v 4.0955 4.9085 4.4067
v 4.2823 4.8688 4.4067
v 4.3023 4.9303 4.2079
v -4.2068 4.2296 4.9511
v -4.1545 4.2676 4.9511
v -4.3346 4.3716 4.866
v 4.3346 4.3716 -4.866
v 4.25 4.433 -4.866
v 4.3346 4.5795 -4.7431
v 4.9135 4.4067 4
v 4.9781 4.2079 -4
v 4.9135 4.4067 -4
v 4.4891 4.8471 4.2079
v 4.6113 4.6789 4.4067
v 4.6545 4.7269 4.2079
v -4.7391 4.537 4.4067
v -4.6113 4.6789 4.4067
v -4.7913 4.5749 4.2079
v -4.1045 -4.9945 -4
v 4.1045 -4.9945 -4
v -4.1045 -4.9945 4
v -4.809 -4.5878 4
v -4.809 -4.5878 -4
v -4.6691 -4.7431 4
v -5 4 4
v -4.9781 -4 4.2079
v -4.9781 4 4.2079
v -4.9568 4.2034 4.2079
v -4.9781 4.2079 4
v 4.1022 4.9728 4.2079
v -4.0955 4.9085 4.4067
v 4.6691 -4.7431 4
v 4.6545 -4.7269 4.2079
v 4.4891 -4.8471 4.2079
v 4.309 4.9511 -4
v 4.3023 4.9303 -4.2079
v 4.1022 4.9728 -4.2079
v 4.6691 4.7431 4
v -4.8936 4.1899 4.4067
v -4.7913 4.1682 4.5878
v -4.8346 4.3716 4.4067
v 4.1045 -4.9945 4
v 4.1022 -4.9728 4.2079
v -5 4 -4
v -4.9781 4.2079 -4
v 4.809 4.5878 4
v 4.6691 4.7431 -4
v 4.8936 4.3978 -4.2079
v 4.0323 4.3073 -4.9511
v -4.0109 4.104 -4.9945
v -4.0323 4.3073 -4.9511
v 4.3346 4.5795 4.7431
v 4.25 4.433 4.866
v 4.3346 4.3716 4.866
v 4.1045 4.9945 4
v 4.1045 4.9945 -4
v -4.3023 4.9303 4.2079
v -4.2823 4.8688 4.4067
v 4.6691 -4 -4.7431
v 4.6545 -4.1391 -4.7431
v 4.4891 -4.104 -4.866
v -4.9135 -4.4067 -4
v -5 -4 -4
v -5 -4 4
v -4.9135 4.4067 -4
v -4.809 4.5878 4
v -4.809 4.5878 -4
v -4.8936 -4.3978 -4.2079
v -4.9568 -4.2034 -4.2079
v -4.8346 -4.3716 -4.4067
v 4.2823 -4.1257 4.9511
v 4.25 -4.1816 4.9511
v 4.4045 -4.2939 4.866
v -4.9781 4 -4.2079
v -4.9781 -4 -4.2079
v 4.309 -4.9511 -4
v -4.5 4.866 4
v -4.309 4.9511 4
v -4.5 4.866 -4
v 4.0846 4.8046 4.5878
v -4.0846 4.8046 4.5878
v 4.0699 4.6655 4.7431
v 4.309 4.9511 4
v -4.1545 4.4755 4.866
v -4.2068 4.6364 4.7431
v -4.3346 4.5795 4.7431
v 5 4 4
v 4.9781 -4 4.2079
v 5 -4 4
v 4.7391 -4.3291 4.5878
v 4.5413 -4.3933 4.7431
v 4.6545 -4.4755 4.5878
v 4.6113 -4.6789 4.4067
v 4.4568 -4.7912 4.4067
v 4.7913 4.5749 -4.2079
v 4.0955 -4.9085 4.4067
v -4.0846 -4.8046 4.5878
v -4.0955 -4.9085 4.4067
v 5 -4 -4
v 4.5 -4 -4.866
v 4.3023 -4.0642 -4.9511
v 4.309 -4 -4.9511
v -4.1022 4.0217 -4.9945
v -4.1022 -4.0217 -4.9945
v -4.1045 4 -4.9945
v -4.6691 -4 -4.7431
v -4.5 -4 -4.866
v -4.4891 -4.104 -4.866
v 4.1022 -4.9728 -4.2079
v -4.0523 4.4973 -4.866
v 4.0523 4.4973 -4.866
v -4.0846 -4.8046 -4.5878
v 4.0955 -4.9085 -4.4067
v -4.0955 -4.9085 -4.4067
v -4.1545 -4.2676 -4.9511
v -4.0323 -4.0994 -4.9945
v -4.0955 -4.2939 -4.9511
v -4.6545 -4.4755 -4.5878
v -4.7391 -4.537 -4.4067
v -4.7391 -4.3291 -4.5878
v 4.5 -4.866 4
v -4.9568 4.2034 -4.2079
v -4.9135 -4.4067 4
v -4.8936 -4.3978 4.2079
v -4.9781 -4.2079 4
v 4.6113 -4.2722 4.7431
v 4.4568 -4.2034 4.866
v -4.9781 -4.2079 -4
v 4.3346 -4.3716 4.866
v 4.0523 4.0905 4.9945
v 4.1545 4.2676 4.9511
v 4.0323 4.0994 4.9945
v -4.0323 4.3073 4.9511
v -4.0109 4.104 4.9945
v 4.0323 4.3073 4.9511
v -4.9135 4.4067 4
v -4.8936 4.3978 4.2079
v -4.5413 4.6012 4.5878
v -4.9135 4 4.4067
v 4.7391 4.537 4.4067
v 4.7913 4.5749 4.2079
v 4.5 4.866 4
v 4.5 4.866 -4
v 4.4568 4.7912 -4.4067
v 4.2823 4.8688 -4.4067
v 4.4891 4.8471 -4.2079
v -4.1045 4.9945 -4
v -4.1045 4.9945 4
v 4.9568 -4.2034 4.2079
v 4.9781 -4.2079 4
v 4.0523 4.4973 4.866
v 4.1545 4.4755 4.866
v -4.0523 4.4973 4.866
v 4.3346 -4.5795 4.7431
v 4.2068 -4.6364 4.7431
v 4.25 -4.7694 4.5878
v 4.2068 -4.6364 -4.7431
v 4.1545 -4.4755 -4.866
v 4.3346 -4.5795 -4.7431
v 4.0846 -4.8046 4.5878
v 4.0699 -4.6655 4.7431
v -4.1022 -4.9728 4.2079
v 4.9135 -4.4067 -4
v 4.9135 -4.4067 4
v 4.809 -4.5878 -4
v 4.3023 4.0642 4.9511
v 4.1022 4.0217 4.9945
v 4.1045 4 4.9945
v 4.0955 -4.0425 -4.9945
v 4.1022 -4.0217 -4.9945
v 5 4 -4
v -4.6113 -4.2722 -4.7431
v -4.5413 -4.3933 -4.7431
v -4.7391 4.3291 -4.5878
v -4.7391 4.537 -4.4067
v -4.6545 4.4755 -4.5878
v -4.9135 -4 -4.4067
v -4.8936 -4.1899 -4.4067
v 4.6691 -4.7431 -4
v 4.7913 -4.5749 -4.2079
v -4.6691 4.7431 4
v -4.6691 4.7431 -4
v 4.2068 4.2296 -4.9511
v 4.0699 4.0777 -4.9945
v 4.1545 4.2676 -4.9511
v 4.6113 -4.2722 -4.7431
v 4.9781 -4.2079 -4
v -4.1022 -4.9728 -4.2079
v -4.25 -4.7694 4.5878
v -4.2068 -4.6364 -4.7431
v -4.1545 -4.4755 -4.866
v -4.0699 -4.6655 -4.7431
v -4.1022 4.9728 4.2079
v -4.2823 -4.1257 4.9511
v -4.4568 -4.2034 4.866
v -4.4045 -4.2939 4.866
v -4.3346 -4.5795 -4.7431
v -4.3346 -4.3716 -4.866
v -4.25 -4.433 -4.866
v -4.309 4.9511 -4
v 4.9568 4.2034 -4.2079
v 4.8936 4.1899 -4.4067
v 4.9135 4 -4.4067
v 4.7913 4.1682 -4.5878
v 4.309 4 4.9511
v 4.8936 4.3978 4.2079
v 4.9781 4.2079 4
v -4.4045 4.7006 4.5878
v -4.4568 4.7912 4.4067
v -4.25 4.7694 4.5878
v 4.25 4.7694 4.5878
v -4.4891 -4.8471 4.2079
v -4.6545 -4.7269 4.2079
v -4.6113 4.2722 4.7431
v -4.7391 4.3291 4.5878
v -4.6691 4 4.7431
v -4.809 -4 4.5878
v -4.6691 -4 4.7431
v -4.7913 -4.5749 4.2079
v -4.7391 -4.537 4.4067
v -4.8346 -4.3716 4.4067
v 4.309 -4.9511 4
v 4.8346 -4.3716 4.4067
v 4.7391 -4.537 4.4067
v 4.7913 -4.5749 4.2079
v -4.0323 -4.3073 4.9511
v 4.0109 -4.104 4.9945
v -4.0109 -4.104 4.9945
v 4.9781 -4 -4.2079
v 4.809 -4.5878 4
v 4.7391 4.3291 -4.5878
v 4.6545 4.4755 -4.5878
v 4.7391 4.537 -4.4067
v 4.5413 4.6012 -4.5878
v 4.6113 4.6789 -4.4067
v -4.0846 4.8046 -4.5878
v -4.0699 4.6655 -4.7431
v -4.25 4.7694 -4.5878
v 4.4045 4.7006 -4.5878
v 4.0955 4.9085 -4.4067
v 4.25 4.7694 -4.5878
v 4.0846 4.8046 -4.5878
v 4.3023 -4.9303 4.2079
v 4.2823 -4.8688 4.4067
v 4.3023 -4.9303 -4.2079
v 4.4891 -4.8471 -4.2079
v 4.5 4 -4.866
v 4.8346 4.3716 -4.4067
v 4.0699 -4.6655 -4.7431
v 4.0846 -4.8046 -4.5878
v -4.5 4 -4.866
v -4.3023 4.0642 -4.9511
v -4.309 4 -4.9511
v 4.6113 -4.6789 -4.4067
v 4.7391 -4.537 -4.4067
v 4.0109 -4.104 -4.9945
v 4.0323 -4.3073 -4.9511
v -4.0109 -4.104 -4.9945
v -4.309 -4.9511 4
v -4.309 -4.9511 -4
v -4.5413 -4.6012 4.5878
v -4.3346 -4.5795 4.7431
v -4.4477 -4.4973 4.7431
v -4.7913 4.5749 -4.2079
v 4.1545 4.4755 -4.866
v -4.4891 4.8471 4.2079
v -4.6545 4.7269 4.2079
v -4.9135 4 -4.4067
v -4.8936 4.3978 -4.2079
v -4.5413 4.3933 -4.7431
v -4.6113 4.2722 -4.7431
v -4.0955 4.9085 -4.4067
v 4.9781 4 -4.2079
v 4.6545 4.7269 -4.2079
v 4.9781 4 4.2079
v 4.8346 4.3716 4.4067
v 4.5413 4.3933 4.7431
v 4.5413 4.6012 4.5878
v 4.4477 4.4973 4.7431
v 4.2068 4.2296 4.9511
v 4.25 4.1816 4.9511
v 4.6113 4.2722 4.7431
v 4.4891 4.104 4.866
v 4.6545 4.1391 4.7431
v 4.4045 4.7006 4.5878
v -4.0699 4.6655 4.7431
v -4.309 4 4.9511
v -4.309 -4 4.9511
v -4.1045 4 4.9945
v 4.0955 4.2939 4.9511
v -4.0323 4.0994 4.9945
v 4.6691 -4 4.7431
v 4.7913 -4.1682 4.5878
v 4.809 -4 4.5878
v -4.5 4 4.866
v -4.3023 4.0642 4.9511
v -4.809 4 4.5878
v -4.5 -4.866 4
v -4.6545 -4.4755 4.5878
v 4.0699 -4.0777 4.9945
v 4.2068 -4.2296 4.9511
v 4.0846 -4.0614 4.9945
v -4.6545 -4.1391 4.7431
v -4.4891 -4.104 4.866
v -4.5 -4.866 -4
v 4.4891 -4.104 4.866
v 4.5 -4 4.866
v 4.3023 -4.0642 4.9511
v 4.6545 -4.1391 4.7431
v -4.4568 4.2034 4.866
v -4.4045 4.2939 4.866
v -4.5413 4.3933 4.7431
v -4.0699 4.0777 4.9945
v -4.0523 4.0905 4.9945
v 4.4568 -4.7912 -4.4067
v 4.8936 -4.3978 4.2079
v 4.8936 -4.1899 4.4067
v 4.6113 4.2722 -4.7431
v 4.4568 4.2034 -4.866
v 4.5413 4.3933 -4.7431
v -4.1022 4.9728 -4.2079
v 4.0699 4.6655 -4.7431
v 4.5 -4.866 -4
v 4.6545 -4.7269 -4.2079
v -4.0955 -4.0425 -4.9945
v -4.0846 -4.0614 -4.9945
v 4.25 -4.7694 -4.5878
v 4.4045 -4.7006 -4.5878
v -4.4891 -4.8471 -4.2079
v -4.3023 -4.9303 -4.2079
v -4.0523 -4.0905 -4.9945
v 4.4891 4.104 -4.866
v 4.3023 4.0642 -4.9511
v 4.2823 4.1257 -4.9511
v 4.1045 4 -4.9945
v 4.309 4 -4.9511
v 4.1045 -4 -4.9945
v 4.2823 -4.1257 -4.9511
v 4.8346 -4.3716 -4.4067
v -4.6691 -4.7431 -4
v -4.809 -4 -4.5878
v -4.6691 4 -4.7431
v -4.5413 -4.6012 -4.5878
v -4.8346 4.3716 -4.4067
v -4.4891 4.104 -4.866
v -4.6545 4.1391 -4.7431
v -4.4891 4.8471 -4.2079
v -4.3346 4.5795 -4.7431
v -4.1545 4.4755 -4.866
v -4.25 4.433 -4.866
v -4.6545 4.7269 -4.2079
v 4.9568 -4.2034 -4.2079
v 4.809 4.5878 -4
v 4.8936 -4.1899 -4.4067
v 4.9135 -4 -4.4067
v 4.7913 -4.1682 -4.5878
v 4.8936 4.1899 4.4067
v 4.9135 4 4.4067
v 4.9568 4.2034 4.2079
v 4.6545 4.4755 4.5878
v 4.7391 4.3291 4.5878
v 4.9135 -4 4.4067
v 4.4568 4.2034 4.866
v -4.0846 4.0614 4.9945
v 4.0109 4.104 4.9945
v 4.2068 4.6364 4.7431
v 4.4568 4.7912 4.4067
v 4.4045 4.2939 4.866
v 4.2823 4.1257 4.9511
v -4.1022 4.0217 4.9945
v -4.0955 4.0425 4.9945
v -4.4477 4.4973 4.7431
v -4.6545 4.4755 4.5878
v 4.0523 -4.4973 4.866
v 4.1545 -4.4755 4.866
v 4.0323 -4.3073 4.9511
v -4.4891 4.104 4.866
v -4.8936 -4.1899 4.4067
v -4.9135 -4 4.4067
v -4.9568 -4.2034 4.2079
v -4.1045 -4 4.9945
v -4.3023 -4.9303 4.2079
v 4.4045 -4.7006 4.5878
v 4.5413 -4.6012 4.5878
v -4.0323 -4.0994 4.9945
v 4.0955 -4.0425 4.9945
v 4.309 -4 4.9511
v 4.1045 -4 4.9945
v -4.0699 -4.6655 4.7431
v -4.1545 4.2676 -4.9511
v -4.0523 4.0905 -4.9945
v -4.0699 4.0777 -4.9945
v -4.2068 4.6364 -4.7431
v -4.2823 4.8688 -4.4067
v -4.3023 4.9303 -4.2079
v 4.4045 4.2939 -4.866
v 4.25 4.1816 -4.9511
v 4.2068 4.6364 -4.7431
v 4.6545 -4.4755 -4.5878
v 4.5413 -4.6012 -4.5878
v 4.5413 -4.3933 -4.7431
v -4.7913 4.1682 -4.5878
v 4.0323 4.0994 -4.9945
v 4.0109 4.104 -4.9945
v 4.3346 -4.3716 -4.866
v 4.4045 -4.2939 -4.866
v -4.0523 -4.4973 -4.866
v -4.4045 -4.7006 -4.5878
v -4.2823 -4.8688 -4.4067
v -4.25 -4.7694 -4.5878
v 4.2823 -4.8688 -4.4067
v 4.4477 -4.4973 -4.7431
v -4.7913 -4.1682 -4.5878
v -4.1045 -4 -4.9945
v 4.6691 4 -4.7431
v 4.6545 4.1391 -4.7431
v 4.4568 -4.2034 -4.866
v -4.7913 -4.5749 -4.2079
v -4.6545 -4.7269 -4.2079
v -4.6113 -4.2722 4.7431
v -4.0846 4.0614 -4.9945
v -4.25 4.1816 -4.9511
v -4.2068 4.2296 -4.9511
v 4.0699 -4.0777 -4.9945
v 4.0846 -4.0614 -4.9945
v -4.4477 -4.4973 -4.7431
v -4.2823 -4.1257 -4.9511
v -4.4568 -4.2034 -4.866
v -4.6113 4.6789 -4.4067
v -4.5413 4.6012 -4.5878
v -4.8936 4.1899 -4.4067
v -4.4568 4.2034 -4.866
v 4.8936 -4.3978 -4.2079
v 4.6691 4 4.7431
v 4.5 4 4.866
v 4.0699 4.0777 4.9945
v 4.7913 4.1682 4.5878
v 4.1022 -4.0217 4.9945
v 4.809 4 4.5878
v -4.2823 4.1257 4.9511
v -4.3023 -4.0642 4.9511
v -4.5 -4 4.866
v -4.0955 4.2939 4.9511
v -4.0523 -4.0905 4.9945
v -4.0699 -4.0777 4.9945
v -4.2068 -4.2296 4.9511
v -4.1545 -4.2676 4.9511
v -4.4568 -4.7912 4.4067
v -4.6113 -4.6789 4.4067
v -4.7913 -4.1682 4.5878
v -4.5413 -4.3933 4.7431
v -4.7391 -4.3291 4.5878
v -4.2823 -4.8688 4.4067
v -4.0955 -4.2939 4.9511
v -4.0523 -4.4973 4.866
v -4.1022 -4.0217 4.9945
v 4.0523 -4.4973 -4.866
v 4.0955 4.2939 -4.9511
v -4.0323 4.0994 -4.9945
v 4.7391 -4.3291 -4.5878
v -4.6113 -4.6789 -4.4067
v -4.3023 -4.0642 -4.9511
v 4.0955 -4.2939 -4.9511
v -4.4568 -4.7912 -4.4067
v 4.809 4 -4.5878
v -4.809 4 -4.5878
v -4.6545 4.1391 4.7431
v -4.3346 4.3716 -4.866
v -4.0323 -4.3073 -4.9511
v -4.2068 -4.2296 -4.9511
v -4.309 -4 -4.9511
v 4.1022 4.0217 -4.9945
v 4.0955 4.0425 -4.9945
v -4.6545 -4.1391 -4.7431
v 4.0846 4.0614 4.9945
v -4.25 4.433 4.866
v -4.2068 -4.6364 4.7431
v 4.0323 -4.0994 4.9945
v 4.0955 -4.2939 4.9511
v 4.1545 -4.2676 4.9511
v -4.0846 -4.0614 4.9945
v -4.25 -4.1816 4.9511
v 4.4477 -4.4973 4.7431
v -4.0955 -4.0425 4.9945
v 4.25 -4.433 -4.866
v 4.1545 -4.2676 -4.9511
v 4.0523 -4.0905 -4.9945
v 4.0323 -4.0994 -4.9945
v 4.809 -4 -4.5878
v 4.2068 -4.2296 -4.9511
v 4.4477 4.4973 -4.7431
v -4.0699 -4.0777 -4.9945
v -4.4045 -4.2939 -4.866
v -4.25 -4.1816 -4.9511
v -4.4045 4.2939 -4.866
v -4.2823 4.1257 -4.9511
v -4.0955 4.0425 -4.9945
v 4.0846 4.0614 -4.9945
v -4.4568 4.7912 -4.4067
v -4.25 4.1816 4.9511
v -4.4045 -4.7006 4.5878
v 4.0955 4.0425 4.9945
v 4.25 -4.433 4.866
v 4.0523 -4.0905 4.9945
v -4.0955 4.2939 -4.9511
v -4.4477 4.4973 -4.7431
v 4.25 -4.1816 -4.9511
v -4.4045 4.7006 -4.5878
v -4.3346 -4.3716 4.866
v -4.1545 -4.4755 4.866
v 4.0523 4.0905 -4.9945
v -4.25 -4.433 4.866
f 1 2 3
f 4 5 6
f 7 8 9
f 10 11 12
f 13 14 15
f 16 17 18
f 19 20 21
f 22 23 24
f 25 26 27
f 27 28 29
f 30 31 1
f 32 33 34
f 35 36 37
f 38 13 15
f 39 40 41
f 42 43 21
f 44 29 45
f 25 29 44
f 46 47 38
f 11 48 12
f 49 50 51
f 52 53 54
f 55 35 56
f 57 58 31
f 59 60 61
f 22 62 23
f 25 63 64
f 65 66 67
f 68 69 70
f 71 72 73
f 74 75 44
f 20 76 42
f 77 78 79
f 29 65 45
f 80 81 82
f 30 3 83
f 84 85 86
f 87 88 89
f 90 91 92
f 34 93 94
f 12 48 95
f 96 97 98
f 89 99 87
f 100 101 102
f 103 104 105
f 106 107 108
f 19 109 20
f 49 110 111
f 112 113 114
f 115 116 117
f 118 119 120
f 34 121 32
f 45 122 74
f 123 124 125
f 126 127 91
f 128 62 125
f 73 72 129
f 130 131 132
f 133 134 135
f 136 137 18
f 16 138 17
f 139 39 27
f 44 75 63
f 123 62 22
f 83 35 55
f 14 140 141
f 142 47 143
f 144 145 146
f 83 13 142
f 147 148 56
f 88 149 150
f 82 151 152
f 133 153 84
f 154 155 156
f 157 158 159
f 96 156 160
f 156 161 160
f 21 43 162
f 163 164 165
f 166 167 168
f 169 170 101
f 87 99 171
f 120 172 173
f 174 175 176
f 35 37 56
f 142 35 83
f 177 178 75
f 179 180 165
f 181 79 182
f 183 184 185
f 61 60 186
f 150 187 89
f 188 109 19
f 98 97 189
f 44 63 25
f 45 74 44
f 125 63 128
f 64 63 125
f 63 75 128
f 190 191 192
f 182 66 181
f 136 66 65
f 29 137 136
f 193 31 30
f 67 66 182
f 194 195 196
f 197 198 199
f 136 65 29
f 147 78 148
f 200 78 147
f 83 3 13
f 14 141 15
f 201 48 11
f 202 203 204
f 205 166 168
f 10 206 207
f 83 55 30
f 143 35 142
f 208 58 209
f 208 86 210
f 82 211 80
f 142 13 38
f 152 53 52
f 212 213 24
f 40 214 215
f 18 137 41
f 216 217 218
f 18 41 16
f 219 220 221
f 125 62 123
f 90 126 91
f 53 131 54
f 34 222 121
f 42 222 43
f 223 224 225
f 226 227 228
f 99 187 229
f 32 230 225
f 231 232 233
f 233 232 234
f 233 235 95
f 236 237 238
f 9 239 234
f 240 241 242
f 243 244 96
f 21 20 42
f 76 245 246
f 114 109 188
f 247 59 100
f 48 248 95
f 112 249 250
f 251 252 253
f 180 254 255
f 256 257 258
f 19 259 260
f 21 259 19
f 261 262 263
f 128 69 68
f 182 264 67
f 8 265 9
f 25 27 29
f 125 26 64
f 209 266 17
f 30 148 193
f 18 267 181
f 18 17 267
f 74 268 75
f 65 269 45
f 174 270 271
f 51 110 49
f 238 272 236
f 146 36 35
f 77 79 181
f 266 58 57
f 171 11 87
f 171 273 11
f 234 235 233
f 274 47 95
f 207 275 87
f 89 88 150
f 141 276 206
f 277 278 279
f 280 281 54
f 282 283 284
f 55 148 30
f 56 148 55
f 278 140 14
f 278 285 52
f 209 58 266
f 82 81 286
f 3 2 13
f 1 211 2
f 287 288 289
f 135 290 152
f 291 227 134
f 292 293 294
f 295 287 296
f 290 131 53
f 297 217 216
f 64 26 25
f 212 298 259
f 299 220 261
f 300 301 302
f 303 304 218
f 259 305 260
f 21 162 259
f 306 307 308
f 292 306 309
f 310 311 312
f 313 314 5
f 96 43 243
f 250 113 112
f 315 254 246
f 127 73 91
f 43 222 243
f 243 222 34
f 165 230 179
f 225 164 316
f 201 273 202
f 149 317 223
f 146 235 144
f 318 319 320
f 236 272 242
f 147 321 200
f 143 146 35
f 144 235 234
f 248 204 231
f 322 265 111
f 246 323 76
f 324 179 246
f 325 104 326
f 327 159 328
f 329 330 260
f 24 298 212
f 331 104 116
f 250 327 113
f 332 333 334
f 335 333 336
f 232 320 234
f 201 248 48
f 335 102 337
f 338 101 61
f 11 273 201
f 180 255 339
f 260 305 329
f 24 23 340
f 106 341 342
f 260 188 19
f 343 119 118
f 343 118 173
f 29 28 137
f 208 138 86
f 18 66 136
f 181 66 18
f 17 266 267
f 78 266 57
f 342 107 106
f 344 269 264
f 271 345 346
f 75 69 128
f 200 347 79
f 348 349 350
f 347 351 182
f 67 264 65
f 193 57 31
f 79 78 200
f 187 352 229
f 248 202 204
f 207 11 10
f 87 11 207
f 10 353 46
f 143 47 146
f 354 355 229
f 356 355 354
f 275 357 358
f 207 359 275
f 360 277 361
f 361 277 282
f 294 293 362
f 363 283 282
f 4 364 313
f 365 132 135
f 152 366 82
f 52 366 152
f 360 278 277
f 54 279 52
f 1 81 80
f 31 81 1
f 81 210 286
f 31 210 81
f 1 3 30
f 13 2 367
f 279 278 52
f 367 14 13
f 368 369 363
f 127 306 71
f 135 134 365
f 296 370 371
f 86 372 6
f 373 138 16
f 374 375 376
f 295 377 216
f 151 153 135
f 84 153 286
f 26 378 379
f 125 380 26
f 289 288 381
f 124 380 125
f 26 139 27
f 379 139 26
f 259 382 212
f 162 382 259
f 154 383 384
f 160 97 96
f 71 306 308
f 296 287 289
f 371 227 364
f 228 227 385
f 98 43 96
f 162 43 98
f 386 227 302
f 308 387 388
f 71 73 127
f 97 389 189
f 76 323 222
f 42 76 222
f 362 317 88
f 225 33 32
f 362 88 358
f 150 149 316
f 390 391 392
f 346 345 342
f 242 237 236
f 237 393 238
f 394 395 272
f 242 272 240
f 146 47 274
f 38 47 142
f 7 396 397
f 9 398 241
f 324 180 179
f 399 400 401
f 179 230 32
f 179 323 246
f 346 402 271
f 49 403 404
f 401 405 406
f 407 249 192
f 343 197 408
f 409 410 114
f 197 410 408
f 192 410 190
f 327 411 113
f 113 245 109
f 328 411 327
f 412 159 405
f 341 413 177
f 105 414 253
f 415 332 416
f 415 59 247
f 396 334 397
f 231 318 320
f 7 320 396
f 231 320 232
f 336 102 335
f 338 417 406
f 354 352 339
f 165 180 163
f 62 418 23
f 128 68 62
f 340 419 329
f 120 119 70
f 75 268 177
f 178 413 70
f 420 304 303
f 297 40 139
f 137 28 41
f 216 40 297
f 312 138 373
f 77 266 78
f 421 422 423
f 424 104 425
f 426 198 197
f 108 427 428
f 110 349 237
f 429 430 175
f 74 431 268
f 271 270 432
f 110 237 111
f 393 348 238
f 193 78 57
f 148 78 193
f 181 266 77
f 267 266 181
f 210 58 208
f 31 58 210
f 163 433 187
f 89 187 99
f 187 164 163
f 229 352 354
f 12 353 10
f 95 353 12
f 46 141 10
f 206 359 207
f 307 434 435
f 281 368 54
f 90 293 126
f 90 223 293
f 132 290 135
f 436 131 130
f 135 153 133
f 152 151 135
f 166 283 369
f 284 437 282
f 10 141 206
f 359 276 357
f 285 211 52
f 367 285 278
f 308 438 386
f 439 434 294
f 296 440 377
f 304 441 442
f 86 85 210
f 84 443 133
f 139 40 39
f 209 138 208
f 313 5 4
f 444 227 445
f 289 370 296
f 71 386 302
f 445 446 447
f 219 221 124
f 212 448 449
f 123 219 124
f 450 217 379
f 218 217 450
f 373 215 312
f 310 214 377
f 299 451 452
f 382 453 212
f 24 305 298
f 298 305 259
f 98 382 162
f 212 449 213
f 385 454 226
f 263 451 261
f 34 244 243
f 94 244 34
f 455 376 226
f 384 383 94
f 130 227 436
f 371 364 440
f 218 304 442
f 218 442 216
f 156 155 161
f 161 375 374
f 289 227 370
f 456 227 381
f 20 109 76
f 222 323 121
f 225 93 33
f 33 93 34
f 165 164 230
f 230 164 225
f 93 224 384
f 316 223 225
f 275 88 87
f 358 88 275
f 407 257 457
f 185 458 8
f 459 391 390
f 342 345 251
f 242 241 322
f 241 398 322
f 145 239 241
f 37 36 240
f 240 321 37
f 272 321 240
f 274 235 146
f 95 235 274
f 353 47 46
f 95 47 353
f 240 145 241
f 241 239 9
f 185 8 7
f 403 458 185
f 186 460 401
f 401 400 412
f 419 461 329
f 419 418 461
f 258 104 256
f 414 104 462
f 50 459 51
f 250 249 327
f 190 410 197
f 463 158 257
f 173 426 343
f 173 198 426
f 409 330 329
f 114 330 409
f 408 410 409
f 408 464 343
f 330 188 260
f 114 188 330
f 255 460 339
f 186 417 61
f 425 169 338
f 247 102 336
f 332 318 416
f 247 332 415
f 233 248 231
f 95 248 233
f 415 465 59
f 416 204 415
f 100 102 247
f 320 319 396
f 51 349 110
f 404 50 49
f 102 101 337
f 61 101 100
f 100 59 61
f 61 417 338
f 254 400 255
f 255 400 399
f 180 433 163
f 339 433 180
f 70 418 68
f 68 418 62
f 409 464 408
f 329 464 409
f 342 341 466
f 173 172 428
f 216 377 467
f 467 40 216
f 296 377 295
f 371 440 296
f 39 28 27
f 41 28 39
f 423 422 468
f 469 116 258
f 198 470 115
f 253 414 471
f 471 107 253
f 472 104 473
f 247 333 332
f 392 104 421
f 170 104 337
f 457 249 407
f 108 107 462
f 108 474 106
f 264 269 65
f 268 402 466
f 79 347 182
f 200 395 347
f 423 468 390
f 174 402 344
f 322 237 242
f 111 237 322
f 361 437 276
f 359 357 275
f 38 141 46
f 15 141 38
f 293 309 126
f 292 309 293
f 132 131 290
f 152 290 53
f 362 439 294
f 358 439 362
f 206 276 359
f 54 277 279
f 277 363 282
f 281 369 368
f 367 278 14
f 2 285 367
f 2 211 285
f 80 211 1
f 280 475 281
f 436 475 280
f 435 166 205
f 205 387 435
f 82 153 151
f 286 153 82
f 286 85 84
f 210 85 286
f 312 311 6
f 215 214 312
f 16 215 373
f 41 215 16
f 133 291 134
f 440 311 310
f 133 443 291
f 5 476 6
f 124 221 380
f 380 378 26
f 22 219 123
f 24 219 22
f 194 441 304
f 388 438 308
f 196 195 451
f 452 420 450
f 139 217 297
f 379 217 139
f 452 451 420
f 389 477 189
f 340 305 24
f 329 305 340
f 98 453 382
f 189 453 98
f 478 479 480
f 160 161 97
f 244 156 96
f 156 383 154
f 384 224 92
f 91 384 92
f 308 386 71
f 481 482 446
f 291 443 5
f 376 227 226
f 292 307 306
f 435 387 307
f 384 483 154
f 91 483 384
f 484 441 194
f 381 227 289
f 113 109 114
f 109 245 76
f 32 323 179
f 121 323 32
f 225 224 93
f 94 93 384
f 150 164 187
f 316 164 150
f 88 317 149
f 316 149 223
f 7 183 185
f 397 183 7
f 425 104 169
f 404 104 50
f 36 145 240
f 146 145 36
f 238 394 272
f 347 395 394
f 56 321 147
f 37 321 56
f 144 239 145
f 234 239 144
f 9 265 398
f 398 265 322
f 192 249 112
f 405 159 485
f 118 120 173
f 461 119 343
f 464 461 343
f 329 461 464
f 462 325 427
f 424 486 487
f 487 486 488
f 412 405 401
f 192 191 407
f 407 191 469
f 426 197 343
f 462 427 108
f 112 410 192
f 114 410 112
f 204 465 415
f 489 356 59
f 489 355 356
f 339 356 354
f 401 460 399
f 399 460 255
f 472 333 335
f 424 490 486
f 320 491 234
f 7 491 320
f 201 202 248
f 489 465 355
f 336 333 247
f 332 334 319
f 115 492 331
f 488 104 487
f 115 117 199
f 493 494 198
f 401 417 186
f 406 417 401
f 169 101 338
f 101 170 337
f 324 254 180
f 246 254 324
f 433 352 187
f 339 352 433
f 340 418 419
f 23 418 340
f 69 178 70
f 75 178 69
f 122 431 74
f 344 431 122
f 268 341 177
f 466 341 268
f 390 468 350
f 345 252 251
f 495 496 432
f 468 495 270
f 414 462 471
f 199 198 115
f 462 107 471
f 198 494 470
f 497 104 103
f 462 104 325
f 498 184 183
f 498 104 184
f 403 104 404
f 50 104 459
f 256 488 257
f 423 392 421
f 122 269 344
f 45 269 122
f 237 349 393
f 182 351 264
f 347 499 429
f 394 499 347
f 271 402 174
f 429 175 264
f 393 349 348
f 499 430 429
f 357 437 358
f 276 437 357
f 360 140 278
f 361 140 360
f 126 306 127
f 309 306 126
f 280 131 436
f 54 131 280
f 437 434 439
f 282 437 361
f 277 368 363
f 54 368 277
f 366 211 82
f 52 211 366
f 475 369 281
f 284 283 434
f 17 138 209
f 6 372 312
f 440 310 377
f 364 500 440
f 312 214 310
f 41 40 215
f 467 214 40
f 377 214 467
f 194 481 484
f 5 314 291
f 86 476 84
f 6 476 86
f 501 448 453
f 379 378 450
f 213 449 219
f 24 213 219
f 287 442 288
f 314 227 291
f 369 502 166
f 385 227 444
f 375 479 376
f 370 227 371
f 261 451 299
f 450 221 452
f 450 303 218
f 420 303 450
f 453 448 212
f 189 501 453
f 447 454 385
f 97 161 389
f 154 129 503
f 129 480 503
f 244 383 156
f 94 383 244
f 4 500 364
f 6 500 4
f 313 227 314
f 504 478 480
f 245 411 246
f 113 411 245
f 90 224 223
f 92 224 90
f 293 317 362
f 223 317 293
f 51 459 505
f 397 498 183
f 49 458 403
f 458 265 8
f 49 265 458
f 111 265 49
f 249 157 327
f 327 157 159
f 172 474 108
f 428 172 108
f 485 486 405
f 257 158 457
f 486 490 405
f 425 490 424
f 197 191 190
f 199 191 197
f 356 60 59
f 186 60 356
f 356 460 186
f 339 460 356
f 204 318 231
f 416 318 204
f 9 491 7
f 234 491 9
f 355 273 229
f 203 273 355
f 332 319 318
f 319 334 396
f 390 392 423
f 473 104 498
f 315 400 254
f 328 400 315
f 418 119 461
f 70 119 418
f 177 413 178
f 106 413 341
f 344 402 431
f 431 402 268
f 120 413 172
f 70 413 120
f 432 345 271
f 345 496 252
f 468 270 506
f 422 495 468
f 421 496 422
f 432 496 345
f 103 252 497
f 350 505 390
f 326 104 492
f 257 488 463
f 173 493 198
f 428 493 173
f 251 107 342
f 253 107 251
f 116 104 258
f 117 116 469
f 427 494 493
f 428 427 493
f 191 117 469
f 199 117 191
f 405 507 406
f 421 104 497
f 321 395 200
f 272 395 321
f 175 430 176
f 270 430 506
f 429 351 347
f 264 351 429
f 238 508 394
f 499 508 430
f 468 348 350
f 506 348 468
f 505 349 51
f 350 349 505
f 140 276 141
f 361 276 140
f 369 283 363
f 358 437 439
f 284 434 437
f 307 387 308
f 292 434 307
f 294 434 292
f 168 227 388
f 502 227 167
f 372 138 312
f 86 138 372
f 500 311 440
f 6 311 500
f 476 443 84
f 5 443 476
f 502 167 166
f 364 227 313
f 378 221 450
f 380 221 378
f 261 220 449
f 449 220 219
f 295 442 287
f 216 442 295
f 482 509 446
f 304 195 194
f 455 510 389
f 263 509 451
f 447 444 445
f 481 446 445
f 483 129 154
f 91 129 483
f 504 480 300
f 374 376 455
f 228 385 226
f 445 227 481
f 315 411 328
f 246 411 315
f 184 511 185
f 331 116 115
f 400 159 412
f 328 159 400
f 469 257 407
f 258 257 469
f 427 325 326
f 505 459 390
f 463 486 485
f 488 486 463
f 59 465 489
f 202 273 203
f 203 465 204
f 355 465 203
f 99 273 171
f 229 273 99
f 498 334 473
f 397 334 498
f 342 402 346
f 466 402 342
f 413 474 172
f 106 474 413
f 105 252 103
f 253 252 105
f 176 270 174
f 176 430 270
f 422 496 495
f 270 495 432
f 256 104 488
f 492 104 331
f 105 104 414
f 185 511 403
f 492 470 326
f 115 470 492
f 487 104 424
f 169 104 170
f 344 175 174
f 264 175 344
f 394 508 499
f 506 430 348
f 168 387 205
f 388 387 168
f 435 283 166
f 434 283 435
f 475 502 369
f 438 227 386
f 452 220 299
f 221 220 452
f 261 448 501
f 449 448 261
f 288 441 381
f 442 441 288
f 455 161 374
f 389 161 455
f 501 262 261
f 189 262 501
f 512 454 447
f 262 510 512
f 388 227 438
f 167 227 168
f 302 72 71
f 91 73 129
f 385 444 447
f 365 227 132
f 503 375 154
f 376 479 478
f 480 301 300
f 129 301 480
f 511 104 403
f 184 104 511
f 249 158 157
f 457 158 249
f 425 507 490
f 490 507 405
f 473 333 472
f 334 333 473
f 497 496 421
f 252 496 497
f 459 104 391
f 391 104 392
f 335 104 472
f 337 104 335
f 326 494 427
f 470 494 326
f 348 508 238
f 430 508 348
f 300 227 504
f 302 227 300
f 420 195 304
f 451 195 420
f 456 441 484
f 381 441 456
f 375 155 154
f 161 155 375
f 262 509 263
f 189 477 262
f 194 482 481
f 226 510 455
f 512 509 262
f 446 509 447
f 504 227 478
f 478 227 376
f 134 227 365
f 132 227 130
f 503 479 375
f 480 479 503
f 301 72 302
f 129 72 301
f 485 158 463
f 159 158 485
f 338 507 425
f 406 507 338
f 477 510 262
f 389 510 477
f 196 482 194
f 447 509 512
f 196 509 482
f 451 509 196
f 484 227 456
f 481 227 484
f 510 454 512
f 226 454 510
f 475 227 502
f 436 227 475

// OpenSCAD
$fn=30;
// roundedcube(10,10,10,2,true);

minkowski_custom_cube(10,10,10,1, true);



module roundedcube(xdim, ydim, zdim, rad, center) {
// wenn rad  = 0 -> = 0.0001


	if (center==true) {
		hull() {
			translate([xdim/2-rad,-ydim/2+rad,-zdim/2])cylinder(zdim, r=rad+0.0001);
			translate([-xdim/2+rad,-ydim/2+rad,-zdim/2])cylinder(zdim, r=rad+0.0001);
			
			translate([xdim/2-rad,ydim/2-rad,-zdim/2])cylinder(zdim, r=rad+0.0001);
			translate([-xdim/2+rad,ydim/2-rad,-zdim/2])cylinder(zdim, r=rad+0.0001);
		}
	} else {
		hull() {
			translate([rad,rad,0])cylinder(zdim, r=rad+0.0001);
			translate([xdim-rad,ydim-rad,0])cylinder(zdim, r=rad+0.0001);
			translate([rad,ydim-rad,0])cylinder(zdim, r=rad+0.0001);
			translate([xdim-rad,rad,0])cylinder(zdim, r=rad+0.0001);
		}
	}
}


module minkowski_custom_cube(xdim, ydim, zdim, rad, center){
	if(center==true) {
		translate([-xdim/2,-ydim/2,-zdim/2])createCube(xdim, ydim, zdim, rad);
	} else {
		createCube(xdim, ydim, zdim, rad);
	}
}

module createCube(xdim, ydim, zdim, rad){
	for(i=[xdim, ydim, zdim]){
		if (i/2 < rad) {
			echo("Warnung: Radius groesser als Kantenlaenge! Wuerfel wird zur Kugel expandiert.");
		}
	}

	translate([rad,rad,rad])minkowski(){
		cube([xdim-2*rad, ydim-2*rad, zdim-2*rad]);
		sphere(rad);
	}
}
